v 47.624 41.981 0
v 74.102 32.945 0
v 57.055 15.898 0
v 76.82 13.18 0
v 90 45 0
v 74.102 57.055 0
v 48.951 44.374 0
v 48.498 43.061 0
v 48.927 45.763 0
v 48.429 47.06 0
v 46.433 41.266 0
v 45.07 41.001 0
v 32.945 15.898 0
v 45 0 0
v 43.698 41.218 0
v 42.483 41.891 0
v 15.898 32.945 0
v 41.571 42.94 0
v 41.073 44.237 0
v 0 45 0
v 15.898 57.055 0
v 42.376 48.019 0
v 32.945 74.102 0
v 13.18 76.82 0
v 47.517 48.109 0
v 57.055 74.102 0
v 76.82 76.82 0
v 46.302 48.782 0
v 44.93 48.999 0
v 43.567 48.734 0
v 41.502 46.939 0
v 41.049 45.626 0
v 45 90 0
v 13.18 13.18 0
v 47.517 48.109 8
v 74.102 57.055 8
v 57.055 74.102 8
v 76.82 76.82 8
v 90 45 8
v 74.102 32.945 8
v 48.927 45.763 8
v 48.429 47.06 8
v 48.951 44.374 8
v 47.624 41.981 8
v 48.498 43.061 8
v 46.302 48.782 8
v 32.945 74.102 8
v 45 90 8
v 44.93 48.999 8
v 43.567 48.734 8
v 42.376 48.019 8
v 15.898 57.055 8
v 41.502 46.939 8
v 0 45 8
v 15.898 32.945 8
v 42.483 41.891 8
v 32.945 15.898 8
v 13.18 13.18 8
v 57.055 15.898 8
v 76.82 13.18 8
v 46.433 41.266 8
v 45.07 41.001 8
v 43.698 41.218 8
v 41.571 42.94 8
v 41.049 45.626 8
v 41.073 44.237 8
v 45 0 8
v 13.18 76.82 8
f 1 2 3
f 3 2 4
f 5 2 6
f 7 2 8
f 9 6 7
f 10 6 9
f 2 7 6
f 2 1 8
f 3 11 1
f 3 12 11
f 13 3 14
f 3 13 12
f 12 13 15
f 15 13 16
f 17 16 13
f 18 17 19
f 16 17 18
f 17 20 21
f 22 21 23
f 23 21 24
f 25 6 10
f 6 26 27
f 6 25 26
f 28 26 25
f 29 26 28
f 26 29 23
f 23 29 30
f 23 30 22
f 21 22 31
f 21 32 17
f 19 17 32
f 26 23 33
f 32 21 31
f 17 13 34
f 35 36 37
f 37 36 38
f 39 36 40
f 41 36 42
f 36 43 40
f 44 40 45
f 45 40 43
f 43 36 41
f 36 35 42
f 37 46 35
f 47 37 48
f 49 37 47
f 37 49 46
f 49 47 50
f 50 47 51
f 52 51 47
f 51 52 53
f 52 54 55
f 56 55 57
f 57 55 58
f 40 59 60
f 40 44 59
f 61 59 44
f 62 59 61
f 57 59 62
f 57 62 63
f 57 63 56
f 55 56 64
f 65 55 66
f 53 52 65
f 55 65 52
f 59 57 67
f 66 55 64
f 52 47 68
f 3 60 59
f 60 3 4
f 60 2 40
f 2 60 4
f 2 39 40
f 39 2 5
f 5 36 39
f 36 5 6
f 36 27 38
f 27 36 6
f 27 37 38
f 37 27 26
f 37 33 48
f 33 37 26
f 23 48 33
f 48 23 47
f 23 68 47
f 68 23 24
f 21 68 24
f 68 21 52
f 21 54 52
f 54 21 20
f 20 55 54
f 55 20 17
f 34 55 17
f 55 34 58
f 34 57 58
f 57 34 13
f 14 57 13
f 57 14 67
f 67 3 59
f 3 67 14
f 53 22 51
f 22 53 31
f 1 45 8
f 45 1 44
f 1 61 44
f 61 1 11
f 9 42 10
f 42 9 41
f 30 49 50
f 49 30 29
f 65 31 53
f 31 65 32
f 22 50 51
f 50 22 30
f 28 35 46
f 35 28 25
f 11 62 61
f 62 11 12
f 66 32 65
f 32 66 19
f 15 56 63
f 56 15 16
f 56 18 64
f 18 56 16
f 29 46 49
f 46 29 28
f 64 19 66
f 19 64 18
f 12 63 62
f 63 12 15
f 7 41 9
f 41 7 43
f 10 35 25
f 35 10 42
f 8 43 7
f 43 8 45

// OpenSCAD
$fn = 32;

// ----------------------------------------------------------------------
// Star wheel: 8-point blunt, R45
// ----------------------------------------------------------------------

// --- parameters (mm) ---
n_points = 8;             // number of points / teeth
r_out = 45;               // tip radius
r_in = 31.5;              // root radius
bore_r = 4;               // centre bore radius
plate_t = 8;              // plate thickness, Z (extrusion height)
bore_d = 8;               // centre bore diameter

profile = [[0, 45], [15.898, 32.945], [13.18, 13.18], [32.945, 15.898], [45, 0], [57.055, 15.898], [76.82, 13.18], [74.102, 32.945], [90, 45], [74.102, 57.055], [76.82, 76.82], [57.055, 74.102], [45, 90], [32.945, 74.102], [13.18, 76.82], [15.898, 57.055]];  // primary outline, 16 points, counter clockwise
void_1 = [[48.927, 45.763], [48.429, 47.06], [47.517, 48.109], [46.302, 48.782], [44.93, 48.999], [43.567, 48.734], [42.376, 48.019], [41.502, 46.939], [41.049, 45.626], [41.073, 44.237], [41.571, 42.94], [42.483, 41.891], [43.698, 41.218], [45.07, 41.001], [46.433, 41.266], [47.624, 41.981], [48.498, 43.061], [48.951, 44.374]];  // centre bore, 18 points

// --- the one profile operation ---
difference() {
  linear_extrude(height = plate_t) polygon(points = profile);
  translate([0, 0, -1])
    linear_extrude(height = plate_t + 2) polygon(points = void_1);
}
